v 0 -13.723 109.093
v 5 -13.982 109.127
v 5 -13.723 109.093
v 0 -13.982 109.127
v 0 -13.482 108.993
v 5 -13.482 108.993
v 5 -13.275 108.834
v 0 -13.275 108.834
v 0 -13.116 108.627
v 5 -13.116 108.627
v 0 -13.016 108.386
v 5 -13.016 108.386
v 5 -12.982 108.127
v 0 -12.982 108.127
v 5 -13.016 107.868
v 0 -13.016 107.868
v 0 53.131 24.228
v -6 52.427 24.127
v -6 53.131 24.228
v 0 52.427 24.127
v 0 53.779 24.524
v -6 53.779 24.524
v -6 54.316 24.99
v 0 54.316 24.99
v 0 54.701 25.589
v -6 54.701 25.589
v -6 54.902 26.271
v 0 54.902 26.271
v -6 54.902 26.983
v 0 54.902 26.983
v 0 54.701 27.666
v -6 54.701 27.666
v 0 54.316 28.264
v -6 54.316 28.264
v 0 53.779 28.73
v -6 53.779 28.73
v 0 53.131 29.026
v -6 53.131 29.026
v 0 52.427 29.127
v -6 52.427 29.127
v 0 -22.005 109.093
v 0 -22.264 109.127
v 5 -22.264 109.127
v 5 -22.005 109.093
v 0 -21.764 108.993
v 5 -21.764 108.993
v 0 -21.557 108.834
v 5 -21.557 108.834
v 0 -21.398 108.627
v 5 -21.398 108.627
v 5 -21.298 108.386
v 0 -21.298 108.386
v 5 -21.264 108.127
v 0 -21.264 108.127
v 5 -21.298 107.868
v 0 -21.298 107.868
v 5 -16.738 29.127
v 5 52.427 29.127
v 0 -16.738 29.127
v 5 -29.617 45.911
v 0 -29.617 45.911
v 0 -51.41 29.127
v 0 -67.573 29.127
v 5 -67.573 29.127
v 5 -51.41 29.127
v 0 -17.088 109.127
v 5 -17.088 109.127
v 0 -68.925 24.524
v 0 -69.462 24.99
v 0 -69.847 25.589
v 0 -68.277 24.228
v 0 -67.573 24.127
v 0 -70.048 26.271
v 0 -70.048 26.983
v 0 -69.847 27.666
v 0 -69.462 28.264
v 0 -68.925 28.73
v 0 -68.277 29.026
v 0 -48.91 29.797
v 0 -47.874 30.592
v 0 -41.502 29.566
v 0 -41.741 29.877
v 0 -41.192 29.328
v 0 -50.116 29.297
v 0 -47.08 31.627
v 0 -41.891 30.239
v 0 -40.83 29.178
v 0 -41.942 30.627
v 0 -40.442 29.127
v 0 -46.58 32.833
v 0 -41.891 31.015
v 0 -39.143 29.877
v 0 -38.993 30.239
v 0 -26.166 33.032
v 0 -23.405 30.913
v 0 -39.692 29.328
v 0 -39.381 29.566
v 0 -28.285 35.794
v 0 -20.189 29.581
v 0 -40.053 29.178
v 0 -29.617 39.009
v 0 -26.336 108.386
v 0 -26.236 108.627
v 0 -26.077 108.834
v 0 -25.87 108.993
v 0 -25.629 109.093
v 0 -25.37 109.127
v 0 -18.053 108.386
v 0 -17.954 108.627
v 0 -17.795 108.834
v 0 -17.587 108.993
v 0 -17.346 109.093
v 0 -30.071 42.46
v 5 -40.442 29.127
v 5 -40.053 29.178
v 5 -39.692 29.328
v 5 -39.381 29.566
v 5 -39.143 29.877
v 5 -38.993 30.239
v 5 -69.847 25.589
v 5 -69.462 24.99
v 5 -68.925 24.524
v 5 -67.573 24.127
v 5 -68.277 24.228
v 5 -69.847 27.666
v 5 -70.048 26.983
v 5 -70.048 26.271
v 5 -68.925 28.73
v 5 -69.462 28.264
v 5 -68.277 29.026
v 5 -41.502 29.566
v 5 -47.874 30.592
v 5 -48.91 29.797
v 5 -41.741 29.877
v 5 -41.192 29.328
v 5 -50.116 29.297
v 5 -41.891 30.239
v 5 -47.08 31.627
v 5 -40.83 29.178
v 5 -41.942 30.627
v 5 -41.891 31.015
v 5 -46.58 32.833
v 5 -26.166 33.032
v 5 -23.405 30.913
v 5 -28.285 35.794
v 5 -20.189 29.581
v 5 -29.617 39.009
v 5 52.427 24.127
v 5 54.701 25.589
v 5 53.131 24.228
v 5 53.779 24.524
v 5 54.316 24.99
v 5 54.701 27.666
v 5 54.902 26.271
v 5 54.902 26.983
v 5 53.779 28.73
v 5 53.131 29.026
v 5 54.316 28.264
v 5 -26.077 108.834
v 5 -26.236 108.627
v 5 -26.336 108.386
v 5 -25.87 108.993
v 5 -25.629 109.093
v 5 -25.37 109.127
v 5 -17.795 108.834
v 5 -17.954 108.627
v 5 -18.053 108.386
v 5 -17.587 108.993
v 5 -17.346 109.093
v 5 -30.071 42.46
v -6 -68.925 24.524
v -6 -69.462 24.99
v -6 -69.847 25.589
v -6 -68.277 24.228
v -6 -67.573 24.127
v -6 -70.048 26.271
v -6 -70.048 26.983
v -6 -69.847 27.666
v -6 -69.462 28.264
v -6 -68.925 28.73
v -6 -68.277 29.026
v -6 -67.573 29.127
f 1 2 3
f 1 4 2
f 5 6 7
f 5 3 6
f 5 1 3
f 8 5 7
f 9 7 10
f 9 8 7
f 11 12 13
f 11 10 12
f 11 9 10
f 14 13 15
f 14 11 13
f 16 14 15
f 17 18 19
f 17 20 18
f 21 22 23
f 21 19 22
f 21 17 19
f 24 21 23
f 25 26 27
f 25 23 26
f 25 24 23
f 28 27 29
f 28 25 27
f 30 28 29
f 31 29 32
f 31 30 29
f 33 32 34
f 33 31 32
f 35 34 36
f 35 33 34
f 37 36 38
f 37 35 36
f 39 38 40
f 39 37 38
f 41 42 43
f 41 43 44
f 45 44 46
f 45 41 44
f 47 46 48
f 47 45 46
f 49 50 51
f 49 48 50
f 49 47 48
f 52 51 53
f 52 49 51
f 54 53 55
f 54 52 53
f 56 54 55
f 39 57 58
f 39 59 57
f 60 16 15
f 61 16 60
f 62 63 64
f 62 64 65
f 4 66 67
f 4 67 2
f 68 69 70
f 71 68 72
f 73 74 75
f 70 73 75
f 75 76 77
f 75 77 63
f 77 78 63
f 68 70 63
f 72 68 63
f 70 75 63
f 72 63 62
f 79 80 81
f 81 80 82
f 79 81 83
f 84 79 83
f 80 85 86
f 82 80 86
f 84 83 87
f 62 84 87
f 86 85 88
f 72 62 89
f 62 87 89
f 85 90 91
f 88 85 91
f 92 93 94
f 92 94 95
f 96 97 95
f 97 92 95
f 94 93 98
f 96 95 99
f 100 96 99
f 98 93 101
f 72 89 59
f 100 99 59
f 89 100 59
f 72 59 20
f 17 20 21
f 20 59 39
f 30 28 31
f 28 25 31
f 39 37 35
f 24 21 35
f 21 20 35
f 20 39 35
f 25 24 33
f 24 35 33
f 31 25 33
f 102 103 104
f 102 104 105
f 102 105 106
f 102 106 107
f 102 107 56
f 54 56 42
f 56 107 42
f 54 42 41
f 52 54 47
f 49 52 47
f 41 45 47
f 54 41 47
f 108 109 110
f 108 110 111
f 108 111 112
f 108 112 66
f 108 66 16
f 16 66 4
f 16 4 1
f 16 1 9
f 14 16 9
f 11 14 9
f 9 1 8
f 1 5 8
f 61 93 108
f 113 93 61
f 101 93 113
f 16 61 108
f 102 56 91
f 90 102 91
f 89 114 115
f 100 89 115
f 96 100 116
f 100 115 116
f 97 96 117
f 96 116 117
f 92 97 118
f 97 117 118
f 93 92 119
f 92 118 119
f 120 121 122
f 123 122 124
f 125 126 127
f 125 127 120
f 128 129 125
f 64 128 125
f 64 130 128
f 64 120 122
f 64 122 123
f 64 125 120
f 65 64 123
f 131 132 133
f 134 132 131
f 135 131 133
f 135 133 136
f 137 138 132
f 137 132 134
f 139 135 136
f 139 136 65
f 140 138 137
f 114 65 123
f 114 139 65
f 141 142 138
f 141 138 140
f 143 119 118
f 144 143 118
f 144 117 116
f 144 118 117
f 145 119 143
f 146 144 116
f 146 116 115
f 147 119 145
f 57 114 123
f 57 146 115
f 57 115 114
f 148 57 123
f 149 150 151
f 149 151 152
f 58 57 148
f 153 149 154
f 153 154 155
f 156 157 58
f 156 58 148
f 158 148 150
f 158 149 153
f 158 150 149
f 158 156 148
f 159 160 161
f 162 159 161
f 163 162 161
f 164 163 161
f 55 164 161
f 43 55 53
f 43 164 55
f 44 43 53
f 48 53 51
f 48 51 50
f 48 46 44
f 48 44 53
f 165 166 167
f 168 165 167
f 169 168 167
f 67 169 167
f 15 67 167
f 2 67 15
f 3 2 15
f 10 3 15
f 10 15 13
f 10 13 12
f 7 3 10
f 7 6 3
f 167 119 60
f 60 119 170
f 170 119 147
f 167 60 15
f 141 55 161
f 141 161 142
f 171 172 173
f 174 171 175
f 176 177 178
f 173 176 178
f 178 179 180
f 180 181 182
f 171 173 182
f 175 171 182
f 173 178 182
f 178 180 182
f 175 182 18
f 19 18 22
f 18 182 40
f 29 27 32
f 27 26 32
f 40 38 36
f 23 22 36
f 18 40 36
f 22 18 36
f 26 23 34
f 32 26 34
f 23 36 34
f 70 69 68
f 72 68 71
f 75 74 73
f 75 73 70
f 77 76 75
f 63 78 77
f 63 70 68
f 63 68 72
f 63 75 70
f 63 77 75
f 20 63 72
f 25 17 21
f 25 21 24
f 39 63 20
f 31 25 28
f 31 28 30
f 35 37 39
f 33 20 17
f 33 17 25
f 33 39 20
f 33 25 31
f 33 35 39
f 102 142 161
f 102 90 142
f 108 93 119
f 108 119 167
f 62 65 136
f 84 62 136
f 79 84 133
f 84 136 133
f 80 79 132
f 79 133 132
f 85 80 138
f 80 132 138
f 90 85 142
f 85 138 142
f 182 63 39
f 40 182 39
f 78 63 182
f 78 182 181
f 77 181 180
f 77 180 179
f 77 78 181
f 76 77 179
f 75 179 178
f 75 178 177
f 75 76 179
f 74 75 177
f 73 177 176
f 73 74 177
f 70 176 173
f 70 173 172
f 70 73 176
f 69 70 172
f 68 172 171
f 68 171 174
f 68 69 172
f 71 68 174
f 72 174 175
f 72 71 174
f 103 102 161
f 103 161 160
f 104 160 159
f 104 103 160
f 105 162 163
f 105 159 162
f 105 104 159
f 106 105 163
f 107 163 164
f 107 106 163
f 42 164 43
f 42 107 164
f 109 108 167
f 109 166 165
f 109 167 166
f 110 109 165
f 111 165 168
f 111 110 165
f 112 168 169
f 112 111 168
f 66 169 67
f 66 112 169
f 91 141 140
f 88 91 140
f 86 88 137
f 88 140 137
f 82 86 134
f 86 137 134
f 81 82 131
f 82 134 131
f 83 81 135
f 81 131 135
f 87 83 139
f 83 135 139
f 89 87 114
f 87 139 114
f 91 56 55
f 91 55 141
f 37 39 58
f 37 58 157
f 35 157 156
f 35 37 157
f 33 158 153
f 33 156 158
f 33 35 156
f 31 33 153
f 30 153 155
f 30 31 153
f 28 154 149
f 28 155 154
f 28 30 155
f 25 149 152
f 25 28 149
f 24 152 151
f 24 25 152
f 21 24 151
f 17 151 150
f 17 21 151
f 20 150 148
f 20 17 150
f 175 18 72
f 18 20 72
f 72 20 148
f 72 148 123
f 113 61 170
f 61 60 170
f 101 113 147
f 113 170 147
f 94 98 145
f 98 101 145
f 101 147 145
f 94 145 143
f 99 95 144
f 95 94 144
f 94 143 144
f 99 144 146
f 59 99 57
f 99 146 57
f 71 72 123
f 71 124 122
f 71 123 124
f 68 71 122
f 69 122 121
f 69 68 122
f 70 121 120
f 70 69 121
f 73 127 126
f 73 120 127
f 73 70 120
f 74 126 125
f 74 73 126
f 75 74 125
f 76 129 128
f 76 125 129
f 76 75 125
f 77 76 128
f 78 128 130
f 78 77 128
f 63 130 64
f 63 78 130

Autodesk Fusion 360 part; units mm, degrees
sketch "Sketch1" plane through (0, 0, 0) normal (1, 0, 0) x (0, 1, 0)
  circle A0 centre (-67.573, 26.6271) radius 2.5
  line L0 (-67.573, 29.1271) -> (52.427, 29.1271)
  line L1 (52.427, 29.1271) -> (52.427, 24.1271)
  line L2 (52.427, 24.1271) -> (-67.573, 24.1271)
  line L3 (-67.573, 24.1271) -> (-67.573, 29.1271)
  circle A1 centre (52.427, 26.6271) radius 2.5
  line L4 (-47.573, 29.1271) -> (-47.573, 44.2726) construction
  line L5 (-47.573, 29.1271) -> (-26.3356, 108.3859)
  line L6 (-25.3697, 109.1271) -> (-22.2639, 109.1271)
  line L7 (-21.298, 107.8682) -> (-42.3966, 29.1271)
  line L8 (-39.2908, 29.1271) -> (-18.0534, 108.3859)
  line L9 (-13.0157, 107.8682) -> (-34.1144, 29.1271)
  line L10 (-17.0875, 109.1271) -> (-13.9817, 109.1271)
  arc A2 (-25.3697, 109.1271) -> (-26.3356, 108.3859) centre (-25.3697, 108.1271) ccw
  arc A3 (-21.298, 107.8682) -> (-22.2639, 109.1271) centre (-22.2639, 108.1271) ccw
  arc A4 (-17.0875, 109.1271) -> (-18.0534, 108.3859) centre (-17.0875, 108.1271) ccw
  arc A5 (-13.0157, 107.8682) -> (-13.9817, 109.1271) centre (-13.9817, 108.1271) ccw
  dimension "d6" = 5
  dimension "d7" = 120
  dimension "d8" = 5
  dimension "d9" = 20
  dimension "d10" = 3
  dimension "d11" = 5
  dimension "d12" = 5
  dimension "d13" = 75
  dimension "d16" = 1
  dimension "d17" = 1
  dimension "d18" = 1
  dimension "d19" = 1
  dimension "d20" = 80
extrude "Extrude1" add sketch "Sketch1" along normal blind 5 makes body 1
fillet "FrontFillet" radius 5 1 edges at (2.5, -47.573, 29.1271) on bodies 1
fillet "RearArmFillet" radius 13.3333 1 edges at (2.5, -34.1144, 29.1271) on bodies 1
extrude "AddBaseThickener" add sketch "Sketch1" against normal blind 6 separate body contours A0 L3 | A0 L0 L2 A1 | A0 L3 | L1 A1 | L1 A1 makes body 2
copy_body "CutPasteBodies2" bodies 1 2 removing the originals makes body 3 makes body 4 in component "Component"
fillet "Fillet1" radius 1.5 1 edges at (2.5, -42.3966, 29.1271) on bodies 3 in component "Component"
fillet "Fillet2" radius 1.5 1 edges at (2.5, -39.2908, 29.1271) on bodies 3 in component "Component"
component "Component" placed x (1, 0, 0) y (0, 1, 0) z (0, 0, 1) at (0, 0, 0)
equation "boardthickness = 3 mm"
equation "fillet = 1 mm"
equation "basethickness = 5 mm"
equation "baselength = 120 mm"
equation "base_setback = 20 mm"
equation "d6 = basethickness"
equation "d7 = baselength"
equation "d8 = d6"
equation "d9 = base_setback"
equation "d10 = boardthickness"
equation "d11 = basethickness"
equation "d12 = d11"
equation "d13 = board_angle"
equation "board_angle = 75 deg"
equation "d16 = fillet"
equation "d17 = fillet"
equation "d20 = holderheight"
equation "holderheight = 80 mm"
equation "d25 = basethickness"
equation "d27 = holderheight / 6"
equation "d28 = -thickener"
equation "thickener = 6 mm"
equation "d32 = boardthickness / 2"
equation "d34 = boardthickness / 2"
